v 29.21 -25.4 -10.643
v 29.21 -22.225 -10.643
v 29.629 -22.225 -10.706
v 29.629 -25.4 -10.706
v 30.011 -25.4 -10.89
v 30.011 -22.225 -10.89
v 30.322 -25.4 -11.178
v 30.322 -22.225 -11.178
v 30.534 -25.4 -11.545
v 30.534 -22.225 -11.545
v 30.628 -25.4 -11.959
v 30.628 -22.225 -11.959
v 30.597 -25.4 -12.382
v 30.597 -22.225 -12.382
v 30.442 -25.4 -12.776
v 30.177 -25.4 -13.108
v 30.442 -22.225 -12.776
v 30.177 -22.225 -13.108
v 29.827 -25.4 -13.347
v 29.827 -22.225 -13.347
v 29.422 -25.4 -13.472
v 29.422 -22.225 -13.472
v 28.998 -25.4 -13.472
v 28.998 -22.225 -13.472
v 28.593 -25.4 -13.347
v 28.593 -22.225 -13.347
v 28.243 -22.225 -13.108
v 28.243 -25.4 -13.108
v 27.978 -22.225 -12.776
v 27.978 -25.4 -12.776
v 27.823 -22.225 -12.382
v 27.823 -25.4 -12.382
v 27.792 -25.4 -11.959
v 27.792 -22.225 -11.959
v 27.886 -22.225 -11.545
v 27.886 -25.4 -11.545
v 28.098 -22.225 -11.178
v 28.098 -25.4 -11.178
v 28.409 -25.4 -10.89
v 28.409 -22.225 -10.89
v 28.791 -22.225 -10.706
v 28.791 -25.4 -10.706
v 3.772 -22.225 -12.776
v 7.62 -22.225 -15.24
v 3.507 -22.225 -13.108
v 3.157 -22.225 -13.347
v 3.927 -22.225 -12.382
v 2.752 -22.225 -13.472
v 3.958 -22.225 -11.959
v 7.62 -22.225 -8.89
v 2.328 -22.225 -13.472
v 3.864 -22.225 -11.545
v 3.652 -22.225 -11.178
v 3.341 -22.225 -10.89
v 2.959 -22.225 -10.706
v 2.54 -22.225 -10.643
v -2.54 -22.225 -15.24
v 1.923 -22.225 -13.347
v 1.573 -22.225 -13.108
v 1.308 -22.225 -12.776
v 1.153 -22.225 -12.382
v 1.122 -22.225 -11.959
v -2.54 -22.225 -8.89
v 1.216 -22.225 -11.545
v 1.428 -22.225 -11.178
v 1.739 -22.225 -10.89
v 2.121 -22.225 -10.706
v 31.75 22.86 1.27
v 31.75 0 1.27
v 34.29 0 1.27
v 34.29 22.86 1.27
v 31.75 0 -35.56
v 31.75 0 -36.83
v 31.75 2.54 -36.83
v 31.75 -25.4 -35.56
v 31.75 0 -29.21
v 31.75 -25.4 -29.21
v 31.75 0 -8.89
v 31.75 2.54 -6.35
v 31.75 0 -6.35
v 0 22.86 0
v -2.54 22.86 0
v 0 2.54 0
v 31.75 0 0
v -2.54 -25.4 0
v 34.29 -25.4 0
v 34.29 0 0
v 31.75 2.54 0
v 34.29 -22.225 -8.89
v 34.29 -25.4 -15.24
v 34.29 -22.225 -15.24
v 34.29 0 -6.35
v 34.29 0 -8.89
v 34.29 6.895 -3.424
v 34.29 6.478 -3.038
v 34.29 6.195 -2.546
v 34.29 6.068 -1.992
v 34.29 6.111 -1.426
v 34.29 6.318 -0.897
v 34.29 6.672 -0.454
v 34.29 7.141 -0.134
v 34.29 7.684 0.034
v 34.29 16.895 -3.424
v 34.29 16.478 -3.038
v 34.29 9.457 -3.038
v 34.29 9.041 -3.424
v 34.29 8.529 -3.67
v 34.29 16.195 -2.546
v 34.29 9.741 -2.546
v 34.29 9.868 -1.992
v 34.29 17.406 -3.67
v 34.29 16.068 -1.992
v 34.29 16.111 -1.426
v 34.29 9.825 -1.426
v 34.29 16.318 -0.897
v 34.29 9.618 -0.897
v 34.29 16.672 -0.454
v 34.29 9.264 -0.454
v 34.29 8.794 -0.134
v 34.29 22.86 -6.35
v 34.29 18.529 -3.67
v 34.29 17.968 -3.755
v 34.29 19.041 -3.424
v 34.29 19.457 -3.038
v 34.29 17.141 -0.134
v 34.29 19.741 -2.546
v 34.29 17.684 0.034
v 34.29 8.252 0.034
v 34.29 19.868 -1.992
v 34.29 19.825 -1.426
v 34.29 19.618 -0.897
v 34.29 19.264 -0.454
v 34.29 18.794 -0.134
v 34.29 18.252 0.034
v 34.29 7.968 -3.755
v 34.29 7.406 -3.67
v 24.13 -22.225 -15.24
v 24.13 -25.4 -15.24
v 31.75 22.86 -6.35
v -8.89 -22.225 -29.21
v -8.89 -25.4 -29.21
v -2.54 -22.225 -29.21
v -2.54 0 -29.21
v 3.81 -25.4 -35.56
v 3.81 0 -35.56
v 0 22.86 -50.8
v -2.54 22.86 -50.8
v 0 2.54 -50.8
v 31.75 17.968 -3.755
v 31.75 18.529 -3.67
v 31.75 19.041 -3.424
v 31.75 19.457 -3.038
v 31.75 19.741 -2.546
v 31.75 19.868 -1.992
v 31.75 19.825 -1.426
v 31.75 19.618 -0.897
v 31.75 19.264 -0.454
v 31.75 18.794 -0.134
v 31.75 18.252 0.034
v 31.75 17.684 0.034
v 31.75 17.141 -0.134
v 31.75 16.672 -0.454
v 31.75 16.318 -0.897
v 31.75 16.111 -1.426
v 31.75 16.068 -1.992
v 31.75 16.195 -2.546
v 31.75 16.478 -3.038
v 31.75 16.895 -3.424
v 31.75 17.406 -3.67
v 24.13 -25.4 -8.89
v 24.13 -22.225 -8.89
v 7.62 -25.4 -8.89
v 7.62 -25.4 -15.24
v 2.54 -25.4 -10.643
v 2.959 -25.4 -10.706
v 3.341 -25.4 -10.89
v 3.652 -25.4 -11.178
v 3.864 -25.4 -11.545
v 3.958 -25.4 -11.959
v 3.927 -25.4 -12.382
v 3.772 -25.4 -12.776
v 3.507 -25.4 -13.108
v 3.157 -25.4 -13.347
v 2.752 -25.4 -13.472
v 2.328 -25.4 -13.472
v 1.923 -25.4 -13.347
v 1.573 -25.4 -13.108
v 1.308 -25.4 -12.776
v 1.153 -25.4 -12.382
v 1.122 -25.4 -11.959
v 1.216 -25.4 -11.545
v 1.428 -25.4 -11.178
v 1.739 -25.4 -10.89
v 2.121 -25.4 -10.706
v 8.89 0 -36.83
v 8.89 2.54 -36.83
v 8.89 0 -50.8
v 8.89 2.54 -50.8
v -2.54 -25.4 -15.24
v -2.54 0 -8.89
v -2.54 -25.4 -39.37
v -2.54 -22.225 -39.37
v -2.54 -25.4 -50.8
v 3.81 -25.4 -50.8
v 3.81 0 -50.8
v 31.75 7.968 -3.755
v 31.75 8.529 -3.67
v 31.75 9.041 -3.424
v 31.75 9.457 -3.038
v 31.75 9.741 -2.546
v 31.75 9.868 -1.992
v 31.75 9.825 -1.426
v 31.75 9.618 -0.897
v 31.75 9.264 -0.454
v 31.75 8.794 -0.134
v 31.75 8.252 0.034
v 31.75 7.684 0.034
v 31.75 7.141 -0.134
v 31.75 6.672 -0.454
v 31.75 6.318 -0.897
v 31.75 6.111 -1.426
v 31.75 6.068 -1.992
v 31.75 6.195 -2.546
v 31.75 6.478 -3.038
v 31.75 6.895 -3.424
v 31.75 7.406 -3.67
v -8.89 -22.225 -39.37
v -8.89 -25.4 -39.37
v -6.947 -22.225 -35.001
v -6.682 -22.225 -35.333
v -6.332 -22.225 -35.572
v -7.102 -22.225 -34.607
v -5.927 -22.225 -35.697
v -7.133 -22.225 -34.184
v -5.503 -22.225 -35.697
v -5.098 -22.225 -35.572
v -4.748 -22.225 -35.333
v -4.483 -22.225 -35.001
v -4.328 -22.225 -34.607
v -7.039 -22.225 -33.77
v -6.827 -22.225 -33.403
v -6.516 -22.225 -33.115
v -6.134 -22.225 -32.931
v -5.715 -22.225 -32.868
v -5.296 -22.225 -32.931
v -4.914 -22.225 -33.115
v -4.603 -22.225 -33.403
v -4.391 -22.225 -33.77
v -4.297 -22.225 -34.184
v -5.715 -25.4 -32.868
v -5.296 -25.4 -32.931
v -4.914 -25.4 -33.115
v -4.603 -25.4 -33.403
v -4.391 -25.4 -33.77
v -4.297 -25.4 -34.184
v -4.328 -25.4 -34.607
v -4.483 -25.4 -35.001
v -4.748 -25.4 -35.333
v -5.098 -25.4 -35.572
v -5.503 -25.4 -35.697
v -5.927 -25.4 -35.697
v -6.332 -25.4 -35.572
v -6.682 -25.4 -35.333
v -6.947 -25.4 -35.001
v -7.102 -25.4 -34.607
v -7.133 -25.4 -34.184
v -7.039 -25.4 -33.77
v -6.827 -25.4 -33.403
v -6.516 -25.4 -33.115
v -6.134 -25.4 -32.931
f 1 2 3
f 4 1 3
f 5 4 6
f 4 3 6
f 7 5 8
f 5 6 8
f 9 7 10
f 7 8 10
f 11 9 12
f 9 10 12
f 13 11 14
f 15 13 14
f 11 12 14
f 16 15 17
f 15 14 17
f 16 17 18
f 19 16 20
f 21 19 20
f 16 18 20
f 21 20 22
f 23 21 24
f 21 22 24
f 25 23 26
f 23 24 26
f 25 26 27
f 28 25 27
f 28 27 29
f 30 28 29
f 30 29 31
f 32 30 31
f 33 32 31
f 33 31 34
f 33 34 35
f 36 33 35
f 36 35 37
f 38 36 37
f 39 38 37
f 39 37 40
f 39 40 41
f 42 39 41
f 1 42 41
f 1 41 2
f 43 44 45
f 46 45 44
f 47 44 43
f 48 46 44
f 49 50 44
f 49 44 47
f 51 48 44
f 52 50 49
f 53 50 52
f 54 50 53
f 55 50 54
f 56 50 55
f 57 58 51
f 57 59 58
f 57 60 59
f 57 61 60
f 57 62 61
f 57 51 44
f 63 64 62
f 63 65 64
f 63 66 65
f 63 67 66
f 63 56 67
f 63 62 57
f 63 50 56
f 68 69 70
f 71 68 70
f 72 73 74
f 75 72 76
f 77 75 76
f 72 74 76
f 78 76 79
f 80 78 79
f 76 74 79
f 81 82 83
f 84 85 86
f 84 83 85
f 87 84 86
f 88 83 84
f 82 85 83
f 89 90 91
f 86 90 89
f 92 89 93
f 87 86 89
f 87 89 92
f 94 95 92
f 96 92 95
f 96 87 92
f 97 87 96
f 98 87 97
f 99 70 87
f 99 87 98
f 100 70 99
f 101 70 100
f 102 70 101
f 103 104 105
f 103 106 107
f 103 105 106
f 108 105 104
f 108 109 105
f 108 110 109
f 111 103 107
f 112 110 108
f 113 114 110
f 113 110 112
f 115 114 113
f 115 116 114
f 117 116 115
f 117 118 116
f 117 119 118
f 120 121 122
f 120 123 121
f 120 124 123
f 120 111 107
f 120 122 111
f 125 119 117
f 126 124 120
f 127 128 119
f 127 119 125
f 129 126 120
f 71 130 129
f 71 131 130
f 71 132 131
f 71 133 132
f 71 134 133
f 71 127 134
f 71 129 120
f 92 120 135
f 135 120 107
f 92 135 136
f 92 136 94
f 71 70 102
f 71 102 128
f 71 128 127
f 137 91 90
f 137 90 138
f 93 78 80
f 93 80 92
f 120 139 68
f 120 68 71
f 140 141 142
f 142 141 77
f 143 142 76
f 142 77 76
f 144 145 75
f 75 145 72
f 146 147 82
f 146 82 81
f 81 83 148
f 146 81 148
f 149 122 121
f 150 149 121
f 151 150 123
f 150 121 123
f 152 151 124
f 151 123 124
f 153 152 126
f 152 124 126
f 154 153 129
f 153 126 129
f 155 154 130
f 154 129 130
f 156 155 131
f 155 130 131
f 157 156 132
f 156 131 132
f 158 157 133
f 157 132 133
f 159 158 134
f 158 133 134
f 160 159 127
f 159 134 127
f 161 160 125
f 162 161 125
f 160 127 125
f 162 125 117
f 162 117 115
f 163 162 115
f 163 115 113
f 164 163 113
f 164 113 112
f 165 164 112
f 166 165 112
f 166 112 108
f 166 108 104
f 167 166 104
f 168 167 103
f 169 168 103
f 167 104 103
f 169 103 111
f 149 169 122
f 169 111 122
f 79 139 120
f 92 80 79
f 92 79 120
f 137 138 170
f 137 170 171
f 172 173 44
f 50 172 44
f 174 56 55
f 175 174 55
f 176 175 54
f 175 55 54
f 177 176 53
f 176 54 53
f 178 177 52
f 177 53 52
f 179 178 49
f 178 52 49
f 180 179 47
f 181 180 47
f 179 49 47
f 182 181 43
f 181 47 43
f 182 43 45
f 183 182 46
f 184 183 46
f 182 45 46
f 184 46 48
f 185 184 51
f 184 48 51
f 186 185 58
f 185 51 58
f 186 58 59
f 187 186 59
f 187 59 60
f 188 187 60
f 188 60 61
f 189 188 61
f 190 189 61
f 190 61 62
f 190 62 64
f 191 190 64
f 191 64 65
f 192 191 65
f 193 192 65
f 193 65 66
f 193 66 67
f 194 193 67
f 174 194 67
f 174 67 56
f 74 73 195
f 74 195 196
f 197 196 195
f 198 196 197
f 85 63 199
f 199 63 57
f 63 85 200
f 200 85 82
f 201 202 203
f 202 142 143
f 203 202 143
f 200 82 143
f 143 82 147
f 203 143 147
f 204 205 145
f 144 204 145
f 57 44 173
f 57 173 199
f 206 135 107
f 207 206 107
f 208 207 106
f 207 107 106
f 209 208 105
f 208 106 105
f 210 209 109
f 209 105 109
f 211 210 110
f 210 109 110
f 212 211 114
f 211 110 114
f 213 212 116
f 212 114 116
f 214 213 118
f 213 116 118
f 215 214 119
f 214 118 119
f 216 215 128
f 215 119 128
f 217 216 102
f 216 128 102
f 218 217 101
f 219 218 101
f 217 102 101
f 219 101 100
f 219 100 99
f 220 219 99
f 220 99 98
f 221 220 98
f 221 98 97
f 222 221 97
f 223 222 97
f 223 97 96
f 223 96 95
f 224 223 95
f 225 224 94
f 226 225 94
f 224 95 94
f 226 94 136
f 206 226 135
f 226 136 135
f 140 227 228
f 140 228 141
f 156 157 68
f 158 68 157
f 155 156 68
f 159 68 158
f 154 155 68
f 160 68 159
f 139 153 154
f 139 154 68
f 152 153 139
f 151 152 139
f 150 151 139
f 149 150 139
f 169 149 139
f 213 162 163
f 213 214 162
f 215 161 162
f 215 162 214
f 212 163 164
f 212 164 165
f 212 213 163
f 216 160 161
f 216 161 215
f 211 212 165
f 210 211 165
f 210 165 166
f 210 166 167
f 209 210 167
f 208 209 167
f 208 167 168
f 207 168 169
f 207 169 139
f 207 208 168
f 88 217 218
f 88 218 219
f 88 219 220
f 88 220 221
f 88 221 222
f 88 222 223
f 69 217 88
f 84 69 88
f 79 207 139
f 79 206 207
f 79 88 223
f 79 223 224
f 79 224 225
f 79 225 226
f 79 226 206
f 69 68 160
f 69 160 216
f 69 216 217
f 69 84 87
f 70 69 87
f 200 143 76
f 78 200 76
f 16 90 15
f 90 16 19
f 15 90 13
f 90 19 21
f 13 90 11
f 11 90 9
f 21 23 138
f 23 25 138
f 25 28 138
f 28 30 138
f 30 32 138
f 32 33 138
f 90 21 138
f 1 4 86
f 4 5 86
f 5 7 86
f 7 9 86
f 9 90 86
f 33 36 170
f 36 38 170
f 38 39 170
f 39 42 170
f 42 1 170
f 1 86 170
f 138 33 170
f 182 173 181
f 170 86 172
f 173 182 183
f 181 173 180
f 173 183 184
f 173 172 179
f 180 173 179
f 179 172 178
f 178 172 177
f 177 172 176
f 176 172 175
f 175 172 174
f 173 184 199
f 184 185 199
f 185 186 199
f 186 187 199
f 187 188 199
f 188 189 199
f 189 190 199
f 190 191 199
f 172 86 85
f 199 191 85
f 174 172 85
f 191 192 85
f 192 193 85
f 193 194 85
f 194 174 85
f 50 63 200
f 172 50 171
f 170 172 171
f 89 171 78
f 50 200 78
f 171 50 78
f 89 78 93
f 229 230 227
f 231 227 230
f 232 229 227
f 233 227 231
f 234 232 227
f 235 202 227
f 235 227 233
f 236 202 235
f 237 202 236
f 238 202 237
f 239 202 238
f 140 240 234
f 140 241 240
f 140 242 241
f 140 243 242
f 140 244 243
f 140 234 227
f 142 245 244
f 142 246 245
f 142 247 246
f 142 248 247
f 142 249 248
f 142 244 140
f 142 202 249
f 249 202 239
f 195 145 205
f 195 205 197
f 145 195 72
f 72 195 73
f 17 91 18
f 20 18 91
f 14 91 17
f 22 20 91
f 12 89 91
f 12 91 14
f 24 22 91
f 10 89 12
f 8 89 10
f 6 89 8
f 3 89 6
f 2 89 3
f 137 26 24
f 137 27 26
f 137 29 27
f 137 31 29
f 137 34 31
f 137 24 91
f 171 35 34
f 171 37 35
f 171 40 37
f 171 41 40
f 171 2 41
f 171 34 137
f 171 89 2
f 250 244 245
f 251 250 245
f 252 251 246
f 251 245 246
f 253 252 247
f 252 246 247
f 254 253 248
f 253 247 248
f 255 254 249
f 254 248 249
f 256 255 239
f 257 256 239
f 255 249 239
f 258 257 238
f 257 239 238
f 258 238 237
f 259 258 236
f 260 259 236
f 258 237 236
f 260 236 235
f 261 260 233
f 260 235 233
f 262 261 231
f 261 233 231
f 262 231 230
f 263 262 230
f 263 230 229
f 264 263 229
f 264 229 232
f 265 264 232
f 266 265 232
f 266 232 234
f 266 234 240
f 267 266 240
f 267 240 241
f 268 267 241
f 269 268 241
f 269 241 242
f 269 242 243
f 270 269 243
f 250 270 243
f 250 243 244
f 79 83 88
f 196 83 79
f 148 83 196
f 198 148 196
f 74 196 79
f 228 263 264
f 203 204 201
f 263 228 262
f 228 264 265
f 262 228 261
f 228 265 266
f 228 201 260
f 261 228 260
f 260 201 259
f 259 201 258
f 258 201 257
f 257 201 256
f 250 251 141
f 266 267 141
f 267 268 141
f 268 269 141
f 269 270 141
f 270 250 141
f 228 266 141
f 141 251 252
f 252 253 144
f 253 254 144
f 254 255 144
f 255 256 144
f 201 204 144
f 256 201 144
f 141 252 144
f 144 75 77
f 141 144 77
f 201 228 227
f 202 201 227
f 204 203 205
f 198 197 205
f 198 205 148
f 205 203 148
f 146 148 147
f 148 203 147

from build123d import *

# Parameters (mm, degrees)
SKETCH1_W           = 31.75
SKETCH1_H           = 54.61
BOSS_EXTRUDE1_DEPTH = 2.54
SKETCH2_W           = 2.54
SKETCH2_H           = 7.62
SKETCH2_H_2         = 54.61
BOSS_EXTRUDE2_DEPTH = 22.86
SKETCH3_W           = 36.83
SKETCH3_H           = 8.89
BOSS_EXTRUDE3_DEPTH = 25.4
SKETCH4_R           = 1.905
CUT_EXTRUDE1_DEPTH  = 2.54
SKETCH5_W           = 36.83
SKETCH5_H           = 25.4
CUT_EXTRUDE2_DEPTH  = 17.78
BOSS_EXTRUDE4_DEPTH = 25.4
SKETCH7_W           = 19.05
SKETCH7_H           = 22.86
CUT_EXTRUDE3_DEPTH  = 25.4
SKETCH8_W           = 3.81
SKETCH8_H           = 48.26
CUT_EXTRUDE4_DEPTH  = 25.4
SKETCH9_W           = 10.16
SKETCH9_H           = 3.175
BOSS_EXTRUDE5_DEPTH = 6.35
SKETCH10_W          = 10.16
SKETCH10_H          = 3.175
BOSS_EXTRUDE6_DEPTH = 6.35
SKETCH11_R          = 1.4224
CUT_EXTRUDE5_DEPTH  = 77.086144107


with BuildPart() as part:
    # Sketch1 → Boss-Extrude1 (new body)
    with BuildSketch(Plane(origin=(0, 0, 0), x_dir=(1, 0, 0), z_dir=(0, 1, 0))):
        with Locations((15.875, 27.305)):
            Rectangle(SKETCH1_W, SKETCH1_H)
    extrude(amount=BOSS_EXTRUDE1_DEPTH)

    # Sketch2 → Boss-Extrude2 (add)
    with BuildSketch(Plane(origin=(0, 0, 0), x_dir=(1, 0, 0), z_dir=(0, 1, 0))):
        with Locations((33.02, 2.54)):
            Rectangle(SKETCH2_W, SKETCH2_H)
        with Locations((33.02, 52.07)):
            Rectangle(SKETCH2_W, SKETCH2_H)
        with Locations((-1.27, 27.305)):
            Rectangle(SKETCH2_W, SKETCH2_H_2)
    extrude(amount=BOSS_EXTRUDE2_DEPTH)

    # Sketch3 → Boss-Extrude3 (add)
    with BuildSketch(Plane.XZ):
        with Locations((15.875, -4.445)):
            Rectangle(SKETCH3_W, SKETCH3_H)
        with Locations((15.875, -50.165)):
            Rectangle(SKETCH3_W, SKETCH3_H)
    extrude(amount=BOSS_EXTRUDE3_DEPTH)

    # Sketch4 → Cut-Extrude1 (cut)
    with BuildSketch(Plane(origin=(34.29, 0, 0), x_dir=(0, 0, -1), z_dir=(1, 0, 0))):
        with Locations((1.85, 17.967840319)):
            Circle(SKETCH4_R)
        with Locations((1.85, 7.967840319)):
            Circle(SKETCH4_R)
        with Locations((52.76, 17.967840319)):
            Circle(SKETCH4_R)
        with Locations((52.76, 7.967840319)):
            Circle(SKETCH4_R)
    extrude(amount=-CUT_EXTRUDE1_DEPTH, mode=Mode.SUBTRACT)

    # Sketch5 → Cut-Extrude2 (cut)
    with BuildSketch(Plane(origin=(0, 0, -54.61), x_dir=(-1, 0, 0), z_dir=(0, 0, -1))):
        with Locations((-15.875, -12.7)):
            Rectangle(SKETCH5_W, SKETCH5_H)
    extrude(amount=-CUT_EXTRUDE2_DEPTH, mode=Mode.SUBTRACT)

    # Sketch6 → Boss-Extrude4 (add)
    with BuildSketch(Plane.XZ):
        Polygon((-2.54, -54.61), (3.81, -54.61), (3.81, -35.56), (31.75, -35.56), (31.75, -29.21), (1.40371894, -29.21), (-2.54, -29.21), align=None)
    extrude(amount=BOSS_EXTRUDE4_DEPTH)

    # Sketch7 → Cut-Extrude3 (cut)
    with BuildSketch(Plane(origin=(34.29, 0, 0), x_dir=(0, 0, -1), z_dir=(1, 0, 0))):
        with Locations((46.355, 11.43)):
            Rectangle(SKETCH7_W, SKETCH7_H)
    extrude(amount=-CUT_EXTRUDE3_DEPTH, mode=Mode.SUBTRACT)

    # Sketch8 → Cut-Extrude4 (cut)
    with BuildSketch(Plane.ZY.offset(2.54)):
        with Locations((-52.705, -1.27)):
            Rectangle(SKETCH8_W, SKETCH8_H)
    extrude(amount=-CUT_EXTRUDE4_DEPTH, mode=Mode.SUBTRACT)

    # Sketch9 → Boss-Extrude5 (add)
    with BuildSketch(Plane(origin=(0, 0, -8.89), x_dir=(-1, 0, 0), z_dir=(0, 0, -1))):
        with Locations((-29.21, -23.8125)):
            Rectangle(SKETCH9_W, SKETCH9_H)
        with Locations((-2.54, -23.8125)):
            Rectangle(SKETCH9_W, SKETCH9_H)
    extrude(amount=BOSS_EXTRUDE5_DEPTH)

    # Sketch10 → Boss-Extrude6 (add)
    with BuildSketch(Plane.ZY.offset(2.54)):
        with Locations((-34.29, -23.8125)):
            Rectangle(SKETCH10_W, SKETCH10_H)
    extrude(amount=BOSS_EXTRUDE6_DEPTH)

    # Sketch11 → Cut-Extrude5 (cut, through all)
    with BuildSketch(Plane(origin=(0, -22.225, 0), x_dir=(1, 0, 0), z_dir=(0, 1, 0))):
        with Locations(Location((29.21, 12.065, 0), (0, 0, 270))):
            Circle(SKETCH11_R)
        with Locations(Location((2.54, 12.065, 0), (0, 0, 270))):
            Circle(SKETCH11_R)
        with Locations(Location((-5.715, 34.29, 0), (0, 0, 270))):
            Circle(SKETCH11_R)
    extrude(amount=-CUT_EXTRUDE5_DEPTH, mode=Mode.SUBTRACT)


solid = part.part
